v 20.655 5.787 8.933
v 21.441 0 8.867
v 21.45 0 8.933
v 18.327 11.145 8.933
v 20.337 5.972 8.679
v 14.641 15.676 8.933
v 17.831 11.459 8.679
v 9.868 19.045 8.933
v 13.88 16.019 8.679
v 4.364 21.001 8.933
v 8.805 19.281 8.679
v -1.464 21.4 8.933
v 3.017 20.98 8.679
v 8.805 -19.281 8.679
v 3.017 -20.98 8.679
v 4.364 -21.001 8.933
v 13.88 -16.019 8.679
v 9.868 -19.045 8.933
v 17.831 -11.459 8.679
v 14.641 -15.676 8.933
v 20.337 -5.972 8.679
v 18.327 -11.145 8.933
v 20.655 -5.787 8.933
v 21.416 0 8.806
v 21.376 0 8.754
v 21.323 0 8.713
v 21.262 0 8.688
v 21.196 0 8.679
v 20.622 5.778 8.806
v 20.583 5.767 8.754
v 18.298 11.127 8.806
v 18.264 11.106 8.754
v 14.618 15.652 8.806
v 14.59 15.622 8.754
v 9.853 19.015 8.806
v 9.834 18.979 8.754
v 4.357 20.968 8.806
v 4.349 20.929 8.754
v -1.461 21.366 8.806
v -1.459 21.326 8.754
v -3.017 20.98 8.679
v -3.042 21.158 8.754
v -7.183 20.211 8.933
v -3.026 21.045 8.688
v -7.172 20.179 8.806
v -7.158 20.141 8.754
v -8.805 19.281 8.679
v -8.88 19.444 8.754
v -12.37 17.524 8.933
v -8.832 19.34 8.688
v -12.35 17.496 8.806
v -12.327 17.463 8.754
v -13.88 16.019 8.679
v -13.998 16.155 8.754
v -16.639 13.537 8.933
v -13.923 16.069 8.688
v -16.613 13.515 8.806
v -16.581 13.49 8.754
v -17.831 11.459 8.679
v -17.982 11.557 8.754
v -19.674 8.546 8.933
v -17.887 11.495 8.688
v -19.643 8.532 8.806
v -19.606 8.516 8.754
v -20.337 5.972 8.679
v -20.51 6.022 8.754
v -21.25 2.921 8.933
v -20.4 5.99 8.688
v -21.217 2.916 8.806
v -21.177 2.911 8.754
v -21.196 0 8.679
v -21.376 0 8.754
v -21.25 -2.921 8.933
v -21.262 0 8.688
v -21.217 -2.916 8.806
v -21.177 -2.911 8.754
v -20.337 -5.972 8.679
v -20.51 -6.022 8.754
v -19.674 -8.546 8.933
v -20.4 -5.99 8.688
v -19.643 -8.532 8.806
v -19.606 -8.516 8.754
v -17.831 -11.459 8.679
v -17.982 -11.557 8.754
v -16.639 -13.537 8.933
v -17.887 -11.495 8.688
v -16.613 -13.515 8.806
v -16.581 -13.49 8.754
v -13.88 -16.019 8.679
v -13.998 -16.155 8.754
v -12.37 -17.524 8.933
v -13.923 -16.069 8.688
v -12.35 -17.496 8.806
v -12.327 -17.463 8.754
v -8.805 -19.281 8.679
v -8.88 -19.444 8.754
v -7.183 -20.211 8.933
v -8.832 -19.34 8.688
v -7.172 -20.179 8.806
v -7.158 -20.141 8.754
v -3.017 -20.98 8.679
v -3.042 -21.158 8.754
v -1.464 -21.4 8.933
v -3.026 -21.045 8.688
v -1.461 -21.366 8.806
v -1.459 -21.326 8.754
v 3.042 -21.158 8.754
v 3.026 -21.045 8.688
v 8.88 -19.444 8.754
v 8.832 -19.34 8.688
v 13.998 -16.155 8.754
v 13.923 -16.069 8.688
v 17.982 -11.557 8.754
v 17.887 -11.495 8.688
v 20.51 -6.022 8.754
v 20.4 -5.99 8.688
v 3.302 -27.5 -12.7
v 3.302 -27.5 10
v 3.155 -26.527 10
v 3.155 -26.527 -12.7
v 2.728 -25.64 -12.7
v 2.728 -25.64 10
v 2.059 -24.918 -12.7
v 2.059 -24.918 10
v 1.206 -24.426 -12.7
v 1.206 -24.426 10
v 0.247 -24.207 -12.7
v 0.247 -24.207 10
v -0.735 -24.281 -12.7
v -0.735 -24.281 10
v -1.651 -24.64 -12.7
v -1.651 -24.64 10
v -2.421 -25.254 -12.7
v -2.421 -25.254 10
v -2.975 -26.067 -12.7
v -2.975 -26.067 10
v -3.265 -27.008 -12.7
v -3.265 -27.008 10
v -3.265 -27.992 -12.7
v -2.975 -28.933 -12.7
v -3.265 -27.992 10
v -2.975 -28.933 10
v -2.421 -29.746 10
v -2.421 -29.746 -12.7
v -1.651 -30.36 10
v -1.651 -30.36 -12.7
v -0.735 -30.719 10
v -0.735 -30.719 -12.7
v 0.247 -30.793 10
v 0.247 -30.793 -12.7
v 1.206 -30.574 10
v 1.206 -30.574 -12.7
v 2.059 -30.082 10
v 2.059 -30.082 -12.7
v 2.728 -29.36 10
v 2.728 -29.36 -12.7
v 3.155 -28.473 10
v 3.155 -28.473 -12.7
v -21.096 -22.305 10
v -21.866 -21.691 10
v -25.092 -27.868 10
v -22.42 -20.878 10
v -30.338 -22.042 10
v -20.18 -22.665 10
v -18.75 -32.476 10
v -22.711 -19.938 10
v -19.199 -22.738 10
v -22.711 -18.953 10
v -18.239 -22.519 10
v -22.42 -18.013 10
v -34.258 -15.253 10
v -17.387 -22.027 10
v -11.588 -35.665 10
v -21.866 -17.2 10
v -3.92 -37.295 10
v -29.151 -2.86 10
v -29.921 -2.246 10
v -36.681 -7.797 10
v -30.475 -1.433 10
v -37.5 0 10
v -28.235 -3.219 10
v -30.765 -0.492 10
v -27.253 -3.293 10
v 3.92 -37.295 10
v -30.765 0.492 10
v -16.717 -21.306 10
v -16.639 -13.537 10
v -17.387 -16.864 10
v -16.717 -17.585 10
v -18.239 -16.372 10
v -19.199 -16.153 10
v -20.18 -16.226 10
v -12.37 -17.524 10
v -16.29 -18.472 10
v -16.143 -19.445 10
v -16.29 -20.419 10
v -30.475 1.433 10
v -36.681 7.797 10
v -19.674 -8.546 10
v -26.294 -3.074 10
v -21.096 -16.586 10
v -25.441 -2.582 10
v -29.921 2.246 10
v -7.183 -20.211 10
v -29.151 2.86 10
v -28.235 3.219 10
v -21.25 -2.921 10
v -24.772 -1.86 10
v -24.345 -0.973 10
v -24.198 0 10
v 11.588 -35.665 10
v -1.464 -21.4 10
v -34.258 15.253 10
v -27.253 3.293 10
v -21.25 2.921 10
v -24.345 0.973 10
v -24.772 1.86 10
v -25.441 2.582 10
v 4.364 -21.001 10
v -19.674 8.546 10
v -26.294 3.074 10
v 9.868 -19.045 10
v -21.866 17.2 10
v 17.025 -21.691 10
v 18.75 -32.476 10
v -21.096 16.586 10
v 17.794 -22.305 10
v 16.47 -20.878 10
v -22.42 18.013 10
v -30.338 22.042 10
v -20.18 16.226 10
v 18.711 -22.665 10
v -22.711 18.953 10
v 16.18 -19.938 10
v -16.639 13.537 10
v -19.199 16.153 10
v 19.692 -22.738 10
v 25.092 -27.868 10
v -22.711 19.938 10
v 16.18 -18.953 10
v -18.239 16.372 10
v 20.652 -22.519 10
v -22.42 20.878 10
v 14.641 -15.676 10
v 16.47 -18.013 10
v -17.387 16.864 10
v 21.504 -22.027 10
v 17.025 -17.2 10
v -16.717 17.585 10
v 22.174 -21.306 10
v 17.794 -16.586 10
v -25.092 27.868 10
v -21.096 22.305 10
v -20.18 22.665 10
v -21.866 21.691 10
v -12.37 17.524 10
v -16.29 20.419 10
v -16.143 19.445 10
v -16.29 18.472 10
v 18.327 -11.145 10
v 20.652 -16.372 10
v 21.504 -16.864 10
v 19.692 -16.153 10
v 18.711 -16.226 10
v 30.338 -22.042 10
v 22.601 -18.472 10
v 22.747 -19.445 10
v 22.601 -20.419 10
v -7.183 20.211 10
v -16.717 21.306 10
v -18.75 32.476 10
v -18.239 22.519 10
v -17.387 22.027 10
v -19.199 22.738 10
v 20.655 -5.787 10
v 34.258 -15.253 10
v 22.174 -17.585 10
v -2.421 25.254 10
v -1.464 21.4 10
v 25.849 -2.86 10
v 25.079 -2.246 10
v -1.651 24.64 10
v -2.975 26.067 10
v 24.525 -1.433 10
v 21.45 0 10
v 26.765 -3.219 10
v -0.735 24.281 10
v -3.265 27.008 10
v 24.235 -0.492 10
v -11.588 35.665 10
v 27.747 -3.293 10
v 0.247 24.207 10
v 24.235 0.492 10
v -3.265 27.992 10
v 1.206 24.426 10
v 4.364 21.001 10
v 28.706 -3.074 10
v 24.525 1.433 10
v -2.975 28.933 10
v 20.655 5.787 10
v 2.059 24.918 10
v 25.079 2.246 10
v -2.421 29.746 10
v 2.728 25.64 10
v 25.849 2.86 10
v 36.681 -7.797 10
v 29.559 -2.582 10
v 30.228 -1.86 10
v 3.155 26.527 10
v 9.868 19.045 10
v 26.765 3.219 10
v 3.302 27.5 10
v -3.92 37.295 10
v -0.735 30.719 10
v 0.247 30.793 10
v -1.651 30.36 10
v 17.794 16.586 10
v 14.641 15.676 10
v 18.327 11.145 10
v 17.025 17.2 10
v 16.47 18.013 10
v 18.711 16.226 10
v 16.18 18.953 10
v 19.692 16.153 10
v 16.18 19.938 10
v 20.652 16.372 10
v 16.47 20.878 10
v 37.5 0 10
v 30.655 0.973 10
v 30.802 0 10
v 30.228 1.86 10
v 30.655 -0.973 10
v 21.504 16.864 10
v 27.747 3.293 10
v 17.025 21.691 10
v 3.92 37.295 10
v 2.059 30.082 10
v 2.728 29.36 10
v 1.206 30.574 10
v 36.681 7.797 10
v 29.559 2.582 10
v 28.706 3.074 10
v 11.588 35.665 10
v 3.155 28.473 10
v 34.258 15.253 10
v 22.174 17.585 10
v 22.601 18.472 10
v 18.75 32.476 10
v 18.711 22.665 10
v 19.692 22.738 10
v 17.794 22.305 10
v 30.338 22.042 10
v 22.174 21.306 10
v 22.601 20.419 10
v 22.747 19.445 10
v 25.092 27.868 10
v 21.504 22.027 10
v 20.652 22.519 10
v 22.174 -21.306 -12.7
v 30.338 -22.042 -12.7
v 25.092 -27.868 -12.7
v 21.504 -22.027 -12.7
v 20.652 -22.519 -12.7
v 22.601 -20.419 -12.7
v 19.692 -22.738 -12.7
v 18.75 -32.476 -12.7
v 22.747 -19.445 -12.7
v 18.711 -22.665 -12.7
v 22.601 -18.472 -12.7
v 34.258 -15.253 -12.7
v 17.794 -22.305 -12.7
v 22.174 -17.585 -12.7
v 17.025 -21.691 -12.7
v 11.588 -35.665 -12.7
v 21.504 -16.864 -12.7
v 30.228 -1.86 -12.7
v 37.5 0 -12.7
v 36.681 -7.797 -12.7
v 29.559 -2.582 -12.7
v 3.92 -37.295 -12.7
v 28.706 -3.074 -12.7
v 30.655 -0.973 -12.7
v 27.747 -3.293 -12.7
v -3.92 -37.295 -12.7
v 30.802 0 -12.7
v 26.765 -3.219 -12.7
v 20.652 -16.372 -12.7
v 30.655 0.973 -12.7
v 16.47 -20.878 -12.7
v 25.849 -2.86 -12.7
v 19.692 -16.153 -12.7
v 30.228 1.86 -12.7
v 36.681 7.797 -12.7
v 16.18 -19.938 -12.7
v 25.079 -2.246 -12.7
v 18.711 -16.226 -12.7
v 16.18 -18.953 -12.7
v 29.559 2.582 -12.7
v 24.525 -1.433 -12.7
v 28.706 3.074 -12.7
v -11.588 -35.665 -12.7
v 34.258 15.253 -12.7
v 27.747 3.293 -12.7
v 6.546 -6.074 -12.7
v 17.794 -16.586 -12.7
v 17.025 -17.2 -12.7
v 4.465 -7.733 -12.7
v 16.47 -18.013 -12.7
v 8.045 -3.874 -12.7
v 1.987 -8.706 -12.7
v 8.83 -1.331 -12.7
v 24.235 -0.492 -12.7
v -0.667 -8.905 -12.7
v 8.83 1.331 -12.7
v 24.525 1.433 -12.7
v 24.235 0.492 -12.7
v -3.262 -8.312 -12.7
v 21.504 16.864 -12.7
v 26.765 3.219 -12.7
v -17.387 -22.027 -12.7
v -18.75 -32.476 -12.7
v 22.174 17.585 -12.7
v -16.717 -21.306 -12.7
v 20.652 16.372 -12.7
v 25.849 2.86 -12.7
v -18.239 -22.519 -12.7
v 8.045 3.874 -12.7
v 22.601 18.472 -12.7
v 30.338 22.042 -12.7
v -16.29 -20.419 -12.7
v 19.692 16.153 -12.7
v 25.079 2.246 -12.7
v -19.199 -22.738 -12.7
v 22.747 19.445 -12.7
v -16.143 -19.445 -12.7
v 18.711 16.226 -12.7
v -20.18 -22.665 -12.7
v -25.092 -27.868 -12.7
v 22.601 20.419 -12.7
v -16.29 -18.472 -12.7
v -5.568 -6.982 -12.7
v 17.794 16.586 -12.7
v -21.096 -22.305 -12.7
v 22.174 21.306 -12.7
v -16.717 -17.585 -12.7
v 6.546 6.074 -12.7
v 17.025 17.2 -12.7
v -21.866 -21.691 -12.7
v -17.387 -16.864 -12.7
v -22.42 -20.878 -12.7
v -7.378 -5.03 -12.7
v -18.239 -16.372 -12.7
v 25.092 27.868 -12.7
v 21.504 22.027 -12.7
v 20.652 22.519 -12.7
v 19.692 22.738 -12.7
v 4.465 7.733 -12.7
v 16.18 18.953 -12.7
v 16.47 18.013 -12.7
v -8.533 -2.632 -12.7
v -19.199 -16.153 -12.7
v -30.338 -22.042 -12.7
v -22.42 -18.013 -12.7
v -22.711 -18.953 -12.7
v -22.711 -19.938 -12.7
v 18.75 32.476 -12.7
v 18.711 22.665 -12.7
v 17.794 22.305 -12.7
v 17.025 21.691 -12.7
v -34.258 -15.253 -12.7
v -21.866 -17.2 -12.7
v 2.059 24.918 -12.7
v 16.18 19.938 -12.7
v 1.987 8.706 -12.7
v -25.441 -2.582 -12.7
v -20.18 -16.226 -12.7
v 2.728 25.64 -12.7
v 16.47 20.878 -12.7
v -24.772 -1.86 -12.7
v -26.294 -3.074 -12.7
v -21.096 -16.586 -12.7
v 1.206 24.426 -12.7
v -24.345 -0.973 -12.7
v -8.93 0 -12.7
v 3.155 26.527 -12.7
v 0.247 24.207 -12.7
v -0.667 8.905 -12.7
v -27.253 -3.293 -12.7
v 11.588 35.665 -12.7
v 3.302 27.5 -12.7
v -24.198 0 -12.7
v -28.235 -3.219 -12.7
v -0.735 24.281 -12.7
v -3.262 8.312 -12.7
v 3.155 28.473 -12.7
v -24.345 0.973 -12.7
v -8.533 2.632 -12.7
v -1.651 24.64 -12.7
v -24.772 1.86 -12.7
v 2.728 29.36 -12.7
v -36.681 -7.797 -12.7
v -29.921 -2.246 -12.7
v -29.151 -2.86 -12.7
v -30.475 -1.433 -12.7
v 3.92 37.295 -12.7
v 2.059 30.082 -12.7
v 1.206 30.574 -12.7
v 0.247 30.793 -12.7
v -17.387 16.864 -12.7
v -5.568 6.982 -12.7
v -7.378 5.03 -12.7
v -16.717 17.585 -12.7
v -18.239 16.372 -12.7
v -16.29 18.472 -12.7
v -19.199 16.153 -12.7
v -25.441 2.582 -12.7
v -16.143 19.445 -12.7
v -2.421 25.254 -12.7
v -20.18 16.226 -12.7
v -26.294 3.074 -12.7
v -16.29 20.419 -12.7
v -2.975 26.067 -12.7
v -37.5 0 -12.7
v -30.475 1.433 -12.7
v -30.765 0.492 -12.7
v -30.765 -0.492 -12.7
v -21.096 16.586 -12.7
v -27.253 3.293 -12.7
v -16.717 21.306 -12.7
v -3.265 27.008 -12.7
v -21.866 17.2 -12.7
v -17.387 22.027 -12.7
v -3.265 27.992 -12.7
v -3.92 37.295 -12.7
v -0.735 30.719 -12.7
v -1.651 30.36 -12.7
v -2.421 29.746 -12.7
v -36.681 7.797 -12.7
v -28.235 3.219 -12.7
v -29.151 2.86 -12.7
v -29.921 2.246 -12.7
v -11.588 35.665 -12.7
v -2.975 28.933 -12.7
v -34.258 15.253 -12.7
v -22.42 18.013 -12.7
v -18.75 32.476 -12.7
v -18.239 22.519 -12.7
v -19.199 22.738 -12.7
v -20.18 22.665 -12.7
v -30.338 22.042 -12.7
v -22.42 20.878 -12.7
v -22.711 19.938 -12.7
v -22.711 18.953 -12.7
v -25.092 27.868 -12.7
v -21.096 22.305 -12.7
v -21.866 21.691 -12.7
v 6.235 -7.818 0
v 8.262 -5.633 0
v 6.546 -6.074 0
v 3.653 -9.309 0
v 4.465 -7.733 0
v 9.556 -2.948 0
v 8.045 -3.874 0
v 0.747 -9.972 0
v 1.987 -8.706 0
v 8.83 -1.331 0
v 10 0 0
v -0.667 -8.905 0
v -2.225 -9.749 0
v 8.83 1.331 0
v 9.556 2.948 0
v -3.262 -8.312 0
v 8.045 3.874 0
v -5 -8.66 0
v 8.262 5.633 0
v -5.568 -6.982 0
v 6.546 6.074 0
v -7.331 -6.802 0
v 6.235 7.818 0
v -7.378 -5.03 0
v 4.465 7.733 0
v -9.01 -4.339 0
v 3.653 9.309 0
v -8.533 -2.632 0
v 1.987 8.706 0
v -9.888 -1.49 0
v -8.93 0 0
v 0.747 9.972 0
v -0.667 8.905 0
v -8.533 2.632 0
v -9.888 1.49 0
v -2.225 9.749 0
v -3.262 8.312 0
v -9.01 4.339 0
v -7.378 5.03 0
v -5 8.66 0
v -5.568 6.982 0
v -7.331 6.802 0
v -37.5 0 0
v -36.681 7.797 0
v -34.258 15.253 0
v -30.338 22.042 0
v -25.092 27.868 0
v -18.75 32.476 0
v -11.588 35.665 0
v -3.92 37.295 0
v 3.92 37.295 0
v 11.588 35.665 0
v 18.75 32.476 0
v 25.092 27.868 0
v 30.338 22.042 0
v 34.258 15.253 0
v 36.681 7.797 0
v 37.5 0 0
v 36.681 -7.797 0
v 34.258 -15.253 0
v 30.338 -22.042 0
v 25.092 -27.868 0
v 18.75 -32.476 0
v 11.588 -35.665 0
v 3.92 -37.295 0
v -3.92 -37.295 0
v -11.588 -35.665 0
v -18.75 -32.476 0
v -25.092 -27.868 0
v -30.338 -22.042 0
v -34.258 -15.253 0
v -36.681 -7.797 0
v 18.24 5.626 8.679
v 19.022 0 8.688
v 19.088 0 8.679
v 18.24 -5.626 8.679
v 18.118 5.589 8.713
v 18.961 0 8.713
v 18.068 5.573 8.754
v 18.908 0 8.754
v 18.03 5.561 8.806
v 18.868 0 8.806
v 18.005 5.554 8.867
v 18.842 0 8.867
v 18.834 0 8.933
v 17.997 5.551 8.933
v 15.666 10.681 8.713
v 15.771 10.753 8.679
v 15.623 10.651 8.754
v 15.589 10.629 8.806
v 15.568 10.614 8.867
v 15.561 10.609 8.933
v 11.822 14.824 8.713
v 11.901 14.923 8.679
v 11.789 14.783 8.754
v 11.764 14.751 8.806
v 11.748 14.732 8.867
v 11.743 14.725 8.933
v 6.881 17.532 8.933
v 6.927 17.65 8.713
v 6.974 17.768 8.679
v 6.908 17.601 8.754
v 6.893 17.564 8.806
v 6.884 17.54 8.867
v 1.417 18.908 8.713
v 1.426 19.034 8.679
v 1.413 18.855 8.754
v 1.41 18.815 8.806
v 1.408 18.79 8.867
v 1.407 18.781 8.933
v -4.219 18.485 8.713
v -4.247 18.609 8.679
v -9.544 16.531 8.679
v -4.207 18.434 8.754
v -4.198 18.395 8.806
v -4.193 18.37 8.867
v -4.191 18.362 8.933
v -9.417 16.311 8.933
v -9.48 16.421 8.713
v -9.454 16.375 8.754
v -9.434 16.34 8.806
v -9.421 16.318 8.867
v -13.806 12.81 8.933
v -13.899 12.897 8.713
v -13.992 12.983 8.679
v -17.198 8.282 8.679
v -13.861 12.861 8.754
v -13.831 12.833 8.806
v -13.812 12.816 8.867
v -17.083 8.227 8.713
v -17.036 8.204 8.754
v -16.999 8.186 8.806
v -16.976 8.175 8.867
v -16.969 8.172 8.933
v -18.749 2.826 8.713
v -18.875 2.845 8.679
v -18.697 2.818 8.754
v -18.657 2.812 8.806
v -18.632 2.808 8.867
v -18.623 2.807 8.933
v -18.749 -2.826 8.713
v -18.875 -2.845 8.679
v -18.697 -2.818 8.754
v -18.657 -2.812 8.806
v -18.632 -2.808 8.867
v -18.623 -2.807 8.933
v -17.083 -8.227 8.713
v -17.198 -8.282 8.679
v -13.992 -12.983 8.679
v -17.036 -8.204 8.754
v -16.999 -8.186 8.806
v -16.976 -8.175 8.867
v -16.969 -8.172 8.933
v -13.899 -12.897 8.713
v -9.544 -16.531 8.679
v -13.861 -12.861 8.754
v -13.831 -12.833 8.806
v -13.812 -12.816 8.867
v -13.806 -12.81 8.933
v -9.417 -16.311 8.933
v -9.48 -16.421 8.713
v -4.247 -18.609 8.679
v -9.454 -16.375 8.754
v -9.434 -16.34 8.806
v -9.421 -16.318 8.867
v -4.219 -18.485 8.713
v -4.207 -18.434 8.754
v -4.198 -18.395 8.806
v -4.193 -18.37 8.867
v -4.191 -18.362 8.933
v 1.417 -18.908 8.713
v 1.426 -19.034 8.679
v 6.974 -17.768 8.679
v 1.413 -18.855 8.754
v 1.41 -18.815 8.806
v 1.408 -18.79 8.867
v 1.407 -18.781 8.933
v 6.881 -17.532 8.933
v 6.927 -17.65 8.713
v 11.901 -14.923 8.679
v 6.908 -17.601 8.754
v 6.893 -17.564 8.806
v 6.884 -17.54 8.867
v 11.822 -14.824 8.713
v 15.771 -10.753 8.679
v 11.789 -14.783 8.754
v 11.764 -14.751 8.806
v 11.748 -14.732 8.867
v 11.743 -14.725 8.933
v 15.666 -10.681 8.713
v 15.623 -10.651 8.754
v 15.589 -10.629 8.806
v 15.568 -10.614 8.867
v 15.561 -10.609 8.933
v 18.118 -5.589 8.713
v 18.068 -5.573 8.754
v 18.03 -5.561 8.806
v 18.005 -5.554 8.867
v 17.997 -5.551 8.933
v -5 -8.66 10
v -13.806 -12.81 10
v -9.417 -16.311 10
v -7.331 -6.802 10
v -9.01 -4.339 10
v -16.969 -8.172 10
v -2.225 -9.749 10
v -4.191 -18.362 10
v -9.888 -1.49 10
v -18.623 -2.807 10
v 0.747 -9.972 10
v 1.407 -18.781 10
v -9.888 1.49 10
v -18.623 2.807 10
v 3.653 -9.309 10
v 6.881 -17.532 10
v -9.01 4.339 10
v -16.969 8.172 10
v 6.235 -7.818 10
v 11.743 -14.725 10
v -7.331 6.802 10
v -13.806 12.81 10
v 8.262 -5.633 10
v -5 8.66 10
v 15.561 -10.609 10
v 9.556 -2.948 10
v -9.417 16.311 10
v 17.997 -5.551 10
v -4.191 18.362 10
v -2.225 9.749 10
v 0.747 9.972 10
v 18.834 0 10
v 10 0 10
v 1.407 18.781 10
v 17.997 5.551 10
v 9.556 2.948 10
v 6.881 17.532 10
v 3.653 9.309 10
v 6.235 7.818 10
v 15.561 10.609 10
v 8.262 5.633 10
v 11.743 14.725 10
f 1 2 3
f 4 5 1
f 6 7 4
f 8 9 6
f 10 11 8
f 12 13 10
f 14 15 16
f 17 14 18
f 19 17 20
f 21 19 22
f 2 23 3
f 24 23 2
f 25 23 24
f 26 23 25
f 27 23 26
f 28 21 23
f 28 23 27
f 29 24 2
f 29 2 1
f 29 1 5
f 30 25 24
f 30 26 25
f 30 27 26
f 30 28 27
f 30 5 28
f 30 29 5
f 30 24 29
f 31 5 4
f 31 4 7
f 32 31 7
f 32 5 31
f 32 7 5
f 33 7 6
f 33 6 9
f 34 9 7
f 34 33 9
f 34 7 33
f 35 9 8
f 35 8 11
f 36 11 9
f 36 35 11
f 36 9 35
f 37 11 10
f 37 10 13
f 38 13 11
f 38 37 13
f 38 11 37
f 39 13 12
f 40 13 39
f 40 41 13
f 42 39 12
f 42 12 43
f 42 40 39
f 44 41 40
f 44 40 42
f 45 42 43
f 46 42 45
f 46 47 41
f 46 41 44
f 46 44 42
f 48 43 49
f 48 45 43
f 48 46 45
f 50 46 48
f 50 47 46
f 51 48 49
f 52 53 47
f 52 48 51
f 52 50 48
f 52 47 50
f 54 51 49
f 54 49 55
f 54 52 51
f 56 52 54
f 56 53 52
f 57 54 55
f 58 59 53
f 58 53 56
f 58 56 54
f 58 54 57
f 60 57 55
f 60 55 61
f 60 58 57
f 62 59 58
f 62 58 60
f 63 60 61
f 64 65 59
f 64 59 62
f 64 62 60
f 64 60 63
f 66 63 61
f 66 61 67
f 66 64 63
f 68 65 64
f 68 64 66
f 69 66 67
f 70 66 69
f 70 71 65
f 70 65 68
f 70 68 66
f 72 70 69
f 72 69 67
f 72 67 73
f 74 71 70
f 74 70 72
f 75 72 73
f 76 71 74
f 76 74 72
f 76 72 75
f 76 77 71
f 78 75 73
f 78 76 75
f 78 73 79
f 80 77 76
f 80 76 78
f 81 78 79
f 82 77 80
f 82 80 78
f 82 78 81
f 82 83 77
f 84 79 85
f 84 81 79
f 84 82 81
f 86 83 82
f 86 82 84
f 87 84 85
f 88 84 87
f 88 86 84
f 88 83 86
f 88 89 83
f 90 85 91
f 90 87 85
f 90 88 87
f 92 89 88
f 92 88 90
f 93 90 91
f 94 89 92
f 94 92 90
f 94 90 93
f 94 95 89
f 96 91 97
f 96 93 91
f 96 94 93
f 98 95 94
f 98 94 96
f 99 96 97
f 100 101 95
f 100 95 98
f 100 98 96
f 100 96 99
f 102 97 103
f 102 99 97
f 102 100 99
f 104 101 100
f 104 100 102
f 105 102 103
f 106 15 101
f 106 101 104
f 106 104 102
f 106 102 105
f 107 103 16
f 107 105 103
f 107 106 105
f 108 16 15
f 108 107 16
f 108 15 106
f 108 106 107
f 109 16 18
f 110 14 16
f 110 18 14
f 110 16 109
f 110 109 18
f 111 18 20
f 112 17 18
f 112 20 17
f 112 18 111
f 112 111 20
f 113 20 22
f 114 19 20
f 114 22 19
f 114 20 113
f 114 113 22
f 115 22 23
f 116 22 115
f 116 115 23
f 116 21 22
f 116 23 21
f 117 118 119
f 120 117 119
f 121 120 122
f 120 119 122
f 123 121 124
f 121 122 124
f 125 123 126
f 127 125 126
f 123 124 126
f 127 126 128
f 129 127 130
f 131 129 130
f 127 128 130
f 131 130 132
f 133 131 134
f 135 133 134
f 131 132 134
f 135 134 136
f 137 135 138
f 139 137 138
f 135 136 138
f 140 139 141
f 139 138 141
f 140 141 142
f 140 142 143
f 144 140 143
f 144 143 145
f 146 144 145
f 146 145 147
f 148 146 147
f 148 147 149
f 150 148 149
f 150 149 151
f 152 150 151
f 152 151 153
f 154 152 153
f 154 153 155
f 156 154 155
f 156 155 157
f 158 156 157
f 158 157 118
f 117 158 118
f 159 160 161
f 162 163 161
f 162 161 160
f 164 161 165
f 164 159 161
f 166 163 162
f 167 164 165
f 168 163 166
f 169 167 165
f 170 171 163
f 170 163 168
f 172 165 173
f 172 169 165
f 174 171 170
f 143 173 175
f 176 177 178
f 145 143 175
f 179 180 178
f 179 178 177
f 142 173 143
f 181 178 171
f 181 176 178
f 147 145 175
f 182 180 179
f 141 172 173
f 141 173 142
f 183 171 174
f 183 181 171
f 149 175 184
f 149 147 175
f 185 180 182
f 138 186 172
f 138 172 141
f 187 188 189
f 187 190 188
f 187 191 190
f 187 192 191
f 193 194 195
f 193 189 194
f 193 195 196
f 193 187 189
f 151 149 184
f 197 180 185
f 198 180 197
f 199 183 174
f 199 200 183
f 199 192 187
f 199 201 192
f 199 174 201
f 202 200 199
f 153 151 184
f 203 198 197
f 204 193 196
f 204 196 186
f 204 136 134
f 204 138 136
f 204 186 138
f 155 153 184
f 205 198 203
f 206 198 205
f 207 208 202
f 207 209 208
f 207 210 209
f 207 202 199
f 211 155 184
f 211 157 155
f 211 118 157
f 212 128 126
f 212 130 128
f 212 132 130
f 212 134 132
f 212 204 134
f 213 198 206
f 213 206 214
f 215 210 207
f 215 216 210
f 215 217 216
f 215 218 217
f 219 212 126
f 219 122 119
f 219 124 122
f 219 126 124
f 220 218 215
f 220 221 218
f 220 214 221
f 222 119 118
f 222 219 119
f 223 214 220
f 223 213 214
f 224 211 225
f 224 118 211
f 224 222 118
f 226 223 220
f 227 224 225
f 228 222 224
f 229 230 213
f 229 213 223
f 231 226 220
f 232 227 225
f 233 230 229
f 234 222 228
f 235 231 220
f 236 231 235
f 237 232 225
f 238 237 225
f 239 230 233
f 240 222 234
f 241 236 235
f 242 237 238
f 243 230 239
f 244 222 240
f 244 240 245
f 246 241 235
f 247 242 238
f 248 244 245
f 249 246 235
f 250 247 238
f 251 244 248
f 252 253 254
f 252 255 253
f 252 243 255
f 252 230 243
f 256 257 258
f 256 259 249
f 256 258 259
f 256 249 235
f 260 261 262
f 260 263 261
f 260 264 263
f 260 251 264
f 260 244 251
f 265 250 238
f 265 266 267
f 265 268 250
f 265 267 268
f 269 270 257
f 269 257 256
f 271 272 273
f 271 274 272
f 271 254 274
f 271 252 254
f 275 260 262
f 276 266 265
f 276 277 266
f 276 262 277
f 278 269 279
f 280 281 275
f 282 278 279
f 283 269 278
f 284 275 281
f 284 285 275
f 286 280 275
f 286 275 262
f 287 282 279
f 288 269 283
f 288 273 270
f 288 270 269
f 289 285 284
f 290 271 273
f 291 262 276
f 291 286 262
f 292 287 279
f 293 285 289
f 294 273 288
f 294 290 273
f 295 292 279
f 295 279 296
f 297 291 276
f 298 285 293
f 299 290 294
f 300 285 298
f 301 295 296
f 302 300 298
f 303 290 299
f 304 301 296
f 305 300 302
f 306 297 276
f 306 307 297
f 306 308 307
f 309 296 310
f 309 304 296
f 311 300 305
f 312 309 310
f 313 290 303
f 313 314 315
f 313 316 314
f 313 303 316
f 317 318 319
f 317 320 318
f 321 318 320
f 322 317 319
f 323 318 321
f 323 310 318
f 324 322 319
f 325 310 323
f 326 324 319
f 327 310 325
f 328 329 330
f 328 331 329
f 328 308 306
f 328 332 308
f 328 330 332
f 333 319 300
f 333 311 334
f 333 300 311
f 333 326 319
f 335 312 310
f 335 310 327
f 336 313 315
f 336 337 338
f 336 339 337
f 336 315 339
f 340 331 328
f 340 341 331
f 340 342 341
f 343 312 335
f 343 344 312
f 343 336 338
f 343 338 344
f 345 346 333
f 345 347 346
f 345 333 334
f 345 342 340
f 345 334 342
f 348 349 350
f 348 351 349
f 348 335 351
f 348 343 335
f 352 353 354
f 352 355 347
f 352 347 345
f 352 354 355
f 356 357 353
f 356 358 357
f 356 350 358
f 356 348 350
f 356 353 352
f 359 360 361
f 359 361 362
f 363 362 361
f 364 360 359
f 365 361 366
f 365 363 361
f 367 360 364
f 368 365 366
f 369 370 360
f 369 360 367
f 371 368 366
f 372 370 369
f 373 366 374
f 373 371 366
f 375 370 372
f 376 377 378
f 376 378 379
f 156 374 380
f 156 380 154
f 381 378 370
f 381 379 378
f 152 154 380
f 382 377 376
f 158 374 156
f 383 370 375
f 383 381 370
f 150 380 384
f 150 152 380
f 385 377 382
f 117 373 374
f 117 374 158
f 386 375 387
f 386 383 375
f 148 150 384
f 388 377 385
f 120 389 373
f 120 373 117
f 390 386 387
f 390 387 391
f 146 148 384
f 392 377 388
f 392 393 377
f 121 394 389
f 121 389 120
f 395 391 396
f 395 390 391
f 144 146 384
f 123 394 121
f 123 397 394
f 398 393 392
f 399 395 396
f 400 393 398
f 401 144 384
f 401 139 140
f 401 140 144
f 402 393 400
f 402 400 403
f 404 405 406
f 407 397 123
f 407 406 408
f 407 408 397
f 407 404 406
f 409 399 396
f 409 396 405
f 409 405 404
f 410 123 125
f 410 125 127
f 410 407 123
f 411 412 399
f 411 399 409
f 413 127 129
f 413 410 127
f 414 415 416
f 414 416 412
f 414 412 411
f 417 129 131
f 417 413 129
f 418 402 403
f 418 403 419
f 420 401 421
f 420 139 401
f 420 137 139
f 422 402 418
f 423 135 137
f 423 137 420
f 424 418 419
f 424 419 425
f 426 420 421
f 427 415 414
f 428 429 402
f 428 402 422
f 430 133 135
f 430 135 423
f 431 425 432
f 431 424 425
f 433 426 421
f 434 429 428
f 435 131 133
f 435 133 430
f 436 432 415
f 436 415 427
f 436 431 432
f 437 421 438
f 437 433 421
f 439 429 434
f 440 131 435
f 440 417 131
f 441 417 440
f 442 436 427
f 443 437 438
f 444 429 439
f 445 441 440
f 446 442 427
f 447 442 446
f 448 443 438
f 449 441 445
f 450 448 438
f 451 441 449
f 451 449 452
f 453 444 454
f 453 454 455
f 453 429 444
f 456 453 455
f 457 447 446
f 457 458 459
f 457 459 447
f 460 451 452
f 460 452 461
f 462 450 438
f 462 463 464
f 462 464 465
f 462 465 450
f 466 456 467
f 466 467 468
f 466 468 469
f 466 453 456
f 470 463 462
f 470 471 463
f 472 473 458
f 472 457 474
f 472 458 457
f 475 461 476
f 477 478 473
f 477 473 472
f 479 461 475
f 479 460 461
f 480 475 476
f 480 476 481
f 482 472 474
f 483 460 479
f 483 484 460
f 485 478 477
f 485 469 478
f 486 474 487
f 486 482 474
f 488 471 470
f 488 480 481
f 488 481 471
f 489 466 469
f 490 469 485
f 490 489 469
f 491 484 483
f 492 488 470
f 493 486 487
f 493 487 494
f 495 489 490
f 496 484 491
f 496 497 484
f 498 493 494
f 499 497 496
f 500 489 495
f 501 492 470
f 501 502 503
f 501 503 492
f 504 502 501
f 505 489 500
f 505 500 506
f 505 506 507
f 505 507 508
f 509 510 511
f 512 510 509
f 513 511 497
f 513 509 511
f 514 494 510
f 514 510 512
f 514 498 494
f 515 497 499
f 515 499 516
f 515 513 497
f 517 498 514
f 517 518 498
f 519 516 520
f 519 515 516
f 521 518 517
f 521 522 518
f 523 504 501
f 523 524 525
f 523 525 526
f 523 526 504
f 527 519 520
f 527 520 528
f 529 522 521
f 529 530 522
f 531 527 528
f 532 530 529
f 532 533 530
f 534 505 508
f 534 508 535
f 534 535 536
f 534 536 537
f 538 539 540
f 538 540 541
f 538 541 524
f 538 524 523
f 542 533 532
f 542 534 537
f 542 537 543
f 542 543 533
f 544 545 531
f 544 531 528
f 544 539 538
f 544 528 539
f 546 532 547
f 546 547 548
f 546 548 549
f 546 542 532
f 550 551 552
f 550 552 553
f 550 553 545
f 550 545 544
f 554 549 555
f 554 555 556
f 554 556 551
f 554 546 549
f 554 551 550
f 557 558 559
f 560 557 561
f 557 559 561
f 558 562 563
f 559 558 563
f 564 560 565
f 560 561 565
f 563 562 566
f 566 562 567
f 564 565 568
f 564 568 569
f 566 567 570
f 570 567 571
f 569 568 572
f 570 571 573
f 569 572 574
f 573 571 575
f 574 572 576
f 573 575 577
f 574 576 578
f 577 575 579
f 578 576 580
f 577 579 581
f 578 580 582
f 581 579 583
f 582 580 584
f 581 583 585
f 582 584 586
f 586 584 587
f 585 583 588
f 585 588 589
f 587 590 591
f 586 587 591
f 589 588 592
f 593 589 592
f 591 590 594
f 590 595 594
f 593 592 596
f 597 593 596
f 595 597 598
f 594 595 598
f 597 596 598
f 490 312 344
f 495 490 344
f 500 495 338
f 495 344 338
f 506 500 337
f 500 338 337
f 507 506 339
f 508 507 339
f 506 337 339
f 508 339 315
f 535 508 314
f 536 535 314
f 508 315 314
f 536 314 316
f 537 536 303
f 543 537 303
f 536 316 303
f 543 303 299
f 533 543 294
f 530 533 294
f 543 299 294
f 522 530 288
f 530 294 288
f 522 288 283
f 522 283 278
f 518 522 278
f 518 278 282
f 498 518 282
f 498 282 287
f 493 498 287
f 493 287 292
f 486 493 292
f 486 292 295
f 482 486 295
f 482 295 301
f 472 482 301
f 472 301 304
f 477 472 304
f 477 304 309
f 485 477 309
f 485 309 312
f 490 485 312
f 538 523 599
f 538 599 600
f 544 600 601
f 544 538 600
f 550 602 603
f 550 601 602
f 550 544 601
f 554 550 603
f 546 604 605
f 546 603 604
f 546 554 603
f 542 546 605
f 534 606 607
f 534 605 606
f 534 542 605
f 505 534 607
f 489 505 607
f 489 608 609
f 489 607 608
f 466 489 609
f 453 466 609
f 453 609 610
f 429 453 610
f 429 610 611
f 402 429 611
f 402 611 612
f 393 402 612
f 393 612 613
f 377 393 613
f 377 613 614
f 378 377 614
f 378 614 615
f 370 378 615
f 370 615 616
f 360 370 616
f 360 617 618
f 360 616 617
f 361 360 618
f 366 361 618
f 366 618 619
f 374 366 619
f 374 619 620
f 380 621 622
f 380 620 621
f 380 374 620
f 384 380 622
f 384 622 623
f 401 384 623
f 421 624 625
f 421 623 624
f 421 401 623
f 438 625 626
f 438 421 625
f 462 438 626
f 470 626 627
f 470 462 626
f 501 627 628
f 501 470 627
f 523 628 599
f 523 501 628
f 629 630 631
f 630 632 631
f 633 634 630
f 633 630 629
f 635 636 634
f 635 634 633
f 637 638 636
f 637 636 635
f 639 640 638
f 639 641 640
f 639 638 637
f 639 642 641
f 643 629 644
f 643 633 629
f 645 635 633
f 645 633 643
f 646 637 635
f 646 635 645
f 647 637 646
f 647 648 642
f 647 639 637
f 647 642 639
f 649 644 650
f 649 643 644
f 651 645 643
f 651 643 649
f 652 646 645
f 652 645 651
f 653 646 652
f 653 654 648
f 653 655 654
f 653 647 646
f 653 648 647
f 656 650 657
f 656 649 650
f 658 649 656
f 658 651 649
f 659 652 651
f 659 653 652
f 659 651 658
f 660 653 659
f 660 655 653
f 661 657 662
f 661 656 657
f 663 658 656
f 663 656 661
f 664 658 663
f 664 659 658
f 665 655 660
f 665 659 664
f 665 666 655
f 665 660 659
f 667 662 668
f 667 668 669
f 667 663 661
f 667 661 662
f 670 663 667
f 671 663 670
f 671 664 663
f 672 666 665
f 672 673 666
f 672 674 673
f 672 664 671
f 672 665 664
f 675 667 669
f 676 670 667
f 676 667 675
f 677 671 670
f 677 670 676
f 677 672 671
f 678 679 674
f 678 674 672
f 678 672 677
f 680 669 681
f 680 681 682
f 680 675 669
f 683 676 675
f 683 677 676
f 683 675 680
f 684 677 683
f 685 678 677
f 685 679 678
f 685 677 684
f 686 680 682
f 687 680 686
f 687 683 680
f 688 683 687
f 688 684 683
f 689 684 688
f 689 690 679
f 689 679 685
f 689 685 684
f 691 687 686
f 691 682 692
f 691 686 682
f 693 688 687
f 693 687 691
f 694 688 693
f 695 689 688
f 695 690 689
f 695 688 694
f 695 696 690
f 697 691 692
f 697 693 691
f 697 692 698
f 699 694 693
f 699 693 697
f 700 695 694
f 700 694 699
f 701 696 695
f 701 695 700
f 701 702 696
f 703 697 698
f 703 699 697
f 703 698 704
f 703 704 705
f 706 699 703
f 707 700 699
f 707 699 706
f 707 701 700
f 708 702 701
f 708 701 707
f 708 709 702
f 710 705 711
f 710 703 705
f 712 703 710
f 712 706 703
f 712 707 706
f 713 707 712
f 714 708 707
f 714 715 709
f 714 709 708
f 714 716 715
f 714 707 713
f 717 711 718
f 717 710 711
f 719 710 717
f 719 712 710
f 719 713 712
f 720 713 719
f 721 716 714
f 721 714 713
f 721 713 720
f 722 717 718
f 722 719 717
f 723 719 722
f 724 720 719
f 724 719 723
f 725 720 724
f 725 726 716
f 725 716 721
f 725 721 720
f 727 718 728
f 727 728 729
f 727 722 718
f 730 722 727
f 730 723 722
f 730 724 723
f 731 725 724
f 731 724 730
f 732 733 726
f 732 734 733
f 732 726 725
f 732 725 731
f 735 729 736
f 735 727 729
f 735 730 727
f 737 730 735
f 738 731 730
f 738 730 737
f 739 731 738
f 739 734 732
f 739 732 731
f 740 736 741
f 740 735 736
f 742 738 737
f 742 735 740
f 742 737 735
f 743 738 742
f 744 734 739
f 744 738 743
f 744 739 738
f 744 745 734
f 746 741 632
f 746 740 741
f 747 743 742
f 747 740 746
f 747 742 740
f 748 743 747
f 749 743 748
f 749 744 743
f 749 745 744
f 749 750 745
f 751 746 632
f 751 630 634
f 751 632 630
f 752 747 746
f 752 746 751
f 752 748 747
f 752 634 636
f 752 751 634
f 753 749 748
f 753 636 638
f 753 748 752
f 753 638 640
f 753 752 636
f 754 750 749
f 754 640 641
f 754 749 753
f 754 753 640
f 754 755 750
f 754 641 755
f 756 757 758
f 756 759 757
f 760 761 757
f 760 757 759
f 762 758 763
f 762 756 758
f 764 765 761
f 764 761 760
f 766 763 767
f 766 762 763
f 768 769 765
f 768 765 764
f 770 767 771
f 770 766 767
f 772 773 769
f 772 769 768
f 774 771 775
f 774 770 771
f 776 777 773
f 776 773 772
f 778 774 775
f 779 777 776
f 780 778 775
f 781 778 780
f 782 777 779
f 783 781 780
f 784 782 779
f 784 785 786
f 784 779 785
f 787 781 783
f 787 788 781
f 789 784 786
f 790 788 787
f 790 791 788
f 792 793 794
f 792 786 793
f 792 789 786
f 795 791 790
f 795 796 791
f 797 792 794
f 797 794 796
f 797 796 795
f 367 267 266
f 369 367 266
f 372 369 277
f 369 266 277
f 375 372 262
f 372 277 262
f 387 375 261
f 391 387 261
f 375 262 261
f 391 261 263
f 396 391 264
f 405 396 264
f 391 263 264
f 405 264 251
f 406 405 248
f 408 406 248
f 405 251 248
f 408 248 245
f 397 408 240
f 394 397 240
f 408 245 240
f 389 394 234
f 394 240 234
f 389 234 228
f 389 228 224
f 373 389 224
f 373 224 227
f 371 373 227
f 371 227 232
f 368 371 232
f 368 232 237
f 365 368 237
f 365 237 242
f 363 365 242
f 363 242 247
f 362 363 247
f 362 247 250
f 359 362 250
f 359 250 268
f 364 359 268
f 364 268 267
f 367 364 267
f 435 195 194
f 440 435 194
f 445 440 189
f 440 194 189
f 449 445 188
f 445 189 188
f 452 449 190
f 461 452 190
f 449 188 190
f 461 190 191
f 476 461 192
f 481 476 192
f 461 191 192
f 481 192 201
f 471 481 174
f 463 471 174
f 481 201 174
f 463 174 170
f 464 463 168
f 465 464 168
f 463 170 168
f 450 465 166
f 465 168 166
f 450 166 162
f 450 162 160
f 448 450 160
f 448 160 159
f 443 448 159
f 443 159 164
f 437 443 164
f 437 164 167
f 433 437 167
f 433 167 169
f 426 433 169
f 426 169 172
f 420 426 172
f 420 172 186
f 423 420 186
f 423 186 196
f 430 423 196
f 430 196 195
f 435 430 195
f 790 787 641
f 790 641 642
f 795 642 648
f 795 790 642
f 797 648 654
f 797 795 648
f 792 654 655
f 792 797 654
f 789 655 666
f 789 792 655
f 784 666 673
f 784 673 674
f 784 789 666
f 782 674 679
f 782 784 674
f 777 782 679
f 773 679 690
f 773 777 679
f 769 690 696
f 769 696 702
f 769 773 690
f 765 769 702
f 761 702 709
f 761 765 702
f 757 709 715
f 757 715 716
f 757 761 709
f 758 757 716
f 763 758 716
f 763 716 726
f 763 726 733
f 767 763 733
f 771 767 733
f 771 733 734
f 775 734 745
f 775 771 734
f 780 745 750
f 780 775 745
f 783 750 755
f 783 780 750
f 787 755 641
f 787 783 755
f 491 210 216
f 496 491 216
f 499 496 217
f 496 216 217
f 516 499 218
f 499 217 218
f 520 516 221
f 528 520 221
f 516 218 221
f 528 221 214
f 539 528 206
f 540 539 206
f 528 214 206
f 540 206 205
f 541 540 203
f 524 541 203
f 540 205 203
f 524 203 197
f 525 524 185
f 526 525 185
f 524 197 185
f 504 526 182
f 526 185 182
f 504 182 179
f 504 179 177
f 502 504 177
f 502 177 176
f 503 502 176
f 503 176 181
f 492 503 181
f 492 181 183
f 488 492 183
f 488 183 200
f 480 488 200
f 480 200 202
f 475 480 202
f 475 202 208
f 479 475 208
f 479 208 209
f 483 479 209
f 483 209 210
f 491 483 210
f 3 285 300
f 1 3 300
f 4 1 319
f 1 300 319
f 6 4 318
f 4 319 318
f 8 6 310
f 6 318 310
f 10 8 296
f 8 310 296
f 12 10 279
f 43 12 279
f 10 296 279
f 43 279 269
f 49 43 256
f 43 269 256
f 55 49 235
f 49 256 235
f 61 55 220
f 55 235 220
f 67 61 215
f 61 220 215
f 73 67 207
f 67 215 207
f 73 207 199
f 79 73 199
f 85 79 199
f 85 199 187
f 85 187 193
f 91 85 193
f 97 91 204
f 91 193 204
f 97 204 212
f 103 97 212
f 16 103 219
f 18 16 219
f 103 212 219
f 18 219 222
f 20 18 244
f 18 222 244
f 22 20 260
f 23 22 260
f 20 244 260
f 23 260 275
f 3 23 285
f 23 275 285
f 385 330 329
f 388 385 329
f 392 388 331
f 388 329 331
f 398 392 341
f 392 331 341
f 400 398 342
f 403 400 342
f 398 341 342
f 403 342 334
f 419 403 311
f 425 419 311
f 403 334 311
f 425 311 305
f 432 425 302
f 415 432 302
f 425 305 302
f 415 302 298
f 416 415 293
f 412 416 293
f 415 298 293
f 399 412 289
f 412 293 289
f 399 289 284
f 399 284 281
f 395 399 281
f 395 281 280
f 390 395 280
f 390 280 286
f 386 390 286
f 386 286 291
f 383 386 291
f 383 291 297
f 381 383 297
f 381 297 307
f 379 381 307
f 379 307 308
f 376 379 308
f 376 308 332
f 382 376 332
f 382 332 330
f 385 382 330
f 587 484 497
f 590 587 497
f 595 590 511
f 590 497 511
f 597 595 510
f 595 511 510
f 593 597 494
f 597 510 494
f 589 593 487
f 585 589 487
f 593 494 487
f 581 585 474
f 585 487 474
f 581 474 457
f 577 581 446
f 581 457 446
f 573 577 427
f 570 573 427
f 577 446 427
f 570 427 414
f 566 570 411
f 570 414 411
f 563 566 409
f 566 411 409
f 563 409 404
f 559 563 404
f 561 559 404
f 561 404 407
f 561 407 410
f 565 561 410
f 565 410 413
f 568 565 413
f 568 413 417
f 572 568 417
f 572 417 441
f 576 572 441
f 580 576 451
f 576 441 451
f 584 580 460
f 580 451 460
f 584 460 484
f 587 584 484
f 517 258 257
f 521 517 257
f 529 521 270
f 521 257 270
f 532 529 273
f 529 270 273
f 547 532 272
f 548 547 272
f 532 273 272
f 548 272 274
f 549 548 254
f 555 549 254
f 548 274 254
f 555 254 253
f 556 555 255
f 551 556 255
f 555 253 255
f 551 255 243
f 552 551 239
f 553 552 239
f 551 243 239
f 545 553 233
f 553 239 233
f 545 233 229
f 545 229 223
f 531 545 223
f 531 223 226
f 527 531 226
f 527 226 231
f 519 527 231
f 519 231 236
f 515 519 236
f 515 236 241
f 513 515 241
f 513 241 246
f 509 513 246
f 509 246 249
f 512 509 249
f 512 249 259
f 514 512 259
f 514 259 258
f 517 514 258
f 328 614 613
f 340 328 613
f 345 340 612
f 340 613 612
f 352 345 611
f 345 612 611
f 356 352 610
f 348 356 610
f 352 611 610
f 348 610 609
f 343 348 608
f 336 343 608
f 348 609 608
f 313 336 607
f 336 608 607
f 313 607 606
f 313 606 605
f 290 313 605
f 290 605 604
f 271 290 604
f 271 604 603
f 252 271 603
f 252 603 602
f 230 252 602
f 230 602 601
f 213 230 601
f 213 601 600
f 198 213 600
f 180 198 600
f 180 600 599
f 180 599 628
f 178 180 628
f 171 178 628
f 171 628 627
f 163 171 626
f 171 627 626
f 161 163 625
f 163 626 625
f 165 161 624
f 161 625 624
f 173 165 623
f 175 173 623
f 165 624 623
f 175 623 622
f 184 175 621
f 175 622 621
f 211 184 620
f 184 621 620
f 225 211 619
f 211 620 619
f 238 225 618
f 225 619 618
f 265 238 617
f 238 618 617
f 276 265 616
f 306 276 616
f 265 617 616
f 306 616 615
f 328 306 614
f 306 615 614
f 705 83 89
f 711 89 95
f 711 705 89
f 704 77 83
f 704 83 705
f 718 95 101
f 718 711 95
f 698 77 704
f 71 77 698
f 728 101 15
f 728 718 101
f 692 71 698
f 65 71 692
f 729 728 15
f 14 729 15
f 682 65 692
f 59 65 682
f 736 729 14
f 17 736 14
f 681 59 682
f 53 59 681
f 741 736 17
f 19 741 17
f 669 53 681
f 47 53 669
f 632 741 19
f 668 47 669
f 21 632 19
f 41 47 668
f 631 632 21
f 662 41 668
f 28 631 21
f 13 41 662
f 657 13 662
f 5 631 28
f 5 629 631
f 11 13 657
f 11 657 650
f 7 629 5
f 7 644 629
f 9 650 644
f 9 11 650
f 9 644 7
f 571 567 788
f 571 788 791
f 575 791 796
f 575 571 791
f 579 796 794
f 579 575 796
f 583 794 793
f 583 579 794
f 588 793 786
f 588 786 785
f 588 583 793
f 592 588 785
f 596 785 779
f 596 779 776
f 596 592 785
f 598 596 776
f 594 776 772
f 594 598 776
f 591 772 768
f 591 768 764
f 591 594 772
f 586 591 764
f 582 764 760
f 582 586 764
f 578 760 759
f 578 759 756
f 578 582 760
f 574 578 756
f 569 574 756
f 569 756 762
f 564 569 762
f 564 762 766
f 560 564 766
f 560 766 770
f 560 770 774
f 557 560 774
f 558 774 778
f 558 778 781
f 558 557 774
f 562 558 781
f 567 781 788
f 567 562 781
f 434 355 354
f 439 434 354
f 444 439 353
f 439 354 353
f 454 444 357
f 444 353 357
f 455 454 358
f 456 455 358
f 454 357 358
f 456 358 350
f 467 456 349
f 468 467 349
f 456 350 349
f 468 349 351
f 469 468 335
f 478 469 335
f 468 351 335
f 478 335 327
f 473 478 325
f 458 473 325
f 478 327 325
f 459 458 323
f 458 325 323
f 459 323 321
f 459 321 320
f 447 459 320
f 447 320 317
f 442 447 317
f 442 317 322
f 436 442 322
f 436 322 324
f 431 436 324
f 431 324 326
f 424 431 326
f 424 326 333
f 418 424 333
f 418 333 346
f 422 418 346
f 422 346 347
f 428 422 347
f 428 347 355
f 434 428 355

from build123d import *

# Parameters (mm, degrees)
SKETCH2_R           = 37.5
SKETCH2_R_2         = 10
BOSS_EXTRUDE1_DEPTH = 10
BOSS_EXTRUDE2_START = 12.7
SKETCH7_R           = 37.5
BOSS_EXTRUDE2_DEPTH = 12.7
SKETCH8_R           = 3.302
CUT_EXTRUDE2_DEPTH  = 58.687000269
SKETCH9_R           = 8.9296875
CUT_EXTRUDE3_DEPTH  = 12.7
SKETCH11_R          = 21.45
SKETCH11_R_2        = 18.8338
CUT_EXTRUDE5_DEPTH  = 1.3208
FILLET1_R           = 0.254


with BuildPart() as part:
    # Sketch2 → Boss-Extrude1 (new body)
    with BuildSketch(Plane.XY):
        Circle(SKETCH2_R)
        Circle(SKETCH2_R_2, mode=Mode.SUBTRACT)
    extrude(amount=BOSS_EXTRUDE1_DEPTH)

    # Sketch7 → Boss-Extrude2 (add)
    with BuildSketch(Plane(origin=(0, 0, 0), x_dir=(-1, 0, 0), z_dir=(0, 0, -1)).offset(BOSS_EXTRUDE2_START)):
        Circle(SKETCH7_R)
    extrude(amount=-BOSS_EXTRUDE2_DEPTH)

    # Sketch8 → Cut-Extrude2 (cut, through all)
    with BuildSketch(Plane.XY.offset(10)):
        with Locations((0, 27.5)):
            Circle(SKETCH8_R)
        with Locations((19.445436483, 19.445436483)):
            Circle(SKETCH8_R)
        with Locations((27.5, 0)):
            Circle(SKETCH8_R)
        with Locations((19.445436483, -19.445436483)):
            Circle(SKETCH8_R)
        with Locations((0, -27.5)):
            Circle(SKETCH8_R)
        with Locations((-19.445436483, -19.445436483)):
            Circle(SKETCH8_R)
        with Locations((-27.5, 0)):
            Circle(SKETCH8_R)
        with Locations((-19.445436483, 19.445436483)):
            Circle(SKETCH8_R)
    extrude(amount=-CUT_EXTRUDE2_DEPTH, mode=Mode.SUBTRACT)

    # Sketch9 → Cut-Extrude3 (cut)
    with BuildSketch(Plane(origin=(0, 0, -12.7), x_dir=(-1, 0, 0), z_dir=(0, 0, -1))):
        Circle(SKETCH9_R)
    extrude(amount=-CUT_EXTRUDE3_DEPTH, mode=Mode.SUBTRACT)

    # Sketch11 → Cut-Extrude5 (cut)
    with BuildSketch(Plane.XY.offset(10)):
        Circle(SKETCH11_R)
        Circle(SKETCH11_R_2, mode=Mode.SUBTRACT)
    extrude(amount=-CUT_EXTRUDE5_DEPTH, mode=Mode.SUBTRACT)

    # Fillet1
    fillet1_edges = [part.edges().sort_by_distance(p)[0] for p in [
        (-21.45, 0, 8.6792),
        (-18.8338, 0, 8.6792),
    ]]
    fillet(fillet1_edges, radius=FILLET1_R)


solid = part.part
